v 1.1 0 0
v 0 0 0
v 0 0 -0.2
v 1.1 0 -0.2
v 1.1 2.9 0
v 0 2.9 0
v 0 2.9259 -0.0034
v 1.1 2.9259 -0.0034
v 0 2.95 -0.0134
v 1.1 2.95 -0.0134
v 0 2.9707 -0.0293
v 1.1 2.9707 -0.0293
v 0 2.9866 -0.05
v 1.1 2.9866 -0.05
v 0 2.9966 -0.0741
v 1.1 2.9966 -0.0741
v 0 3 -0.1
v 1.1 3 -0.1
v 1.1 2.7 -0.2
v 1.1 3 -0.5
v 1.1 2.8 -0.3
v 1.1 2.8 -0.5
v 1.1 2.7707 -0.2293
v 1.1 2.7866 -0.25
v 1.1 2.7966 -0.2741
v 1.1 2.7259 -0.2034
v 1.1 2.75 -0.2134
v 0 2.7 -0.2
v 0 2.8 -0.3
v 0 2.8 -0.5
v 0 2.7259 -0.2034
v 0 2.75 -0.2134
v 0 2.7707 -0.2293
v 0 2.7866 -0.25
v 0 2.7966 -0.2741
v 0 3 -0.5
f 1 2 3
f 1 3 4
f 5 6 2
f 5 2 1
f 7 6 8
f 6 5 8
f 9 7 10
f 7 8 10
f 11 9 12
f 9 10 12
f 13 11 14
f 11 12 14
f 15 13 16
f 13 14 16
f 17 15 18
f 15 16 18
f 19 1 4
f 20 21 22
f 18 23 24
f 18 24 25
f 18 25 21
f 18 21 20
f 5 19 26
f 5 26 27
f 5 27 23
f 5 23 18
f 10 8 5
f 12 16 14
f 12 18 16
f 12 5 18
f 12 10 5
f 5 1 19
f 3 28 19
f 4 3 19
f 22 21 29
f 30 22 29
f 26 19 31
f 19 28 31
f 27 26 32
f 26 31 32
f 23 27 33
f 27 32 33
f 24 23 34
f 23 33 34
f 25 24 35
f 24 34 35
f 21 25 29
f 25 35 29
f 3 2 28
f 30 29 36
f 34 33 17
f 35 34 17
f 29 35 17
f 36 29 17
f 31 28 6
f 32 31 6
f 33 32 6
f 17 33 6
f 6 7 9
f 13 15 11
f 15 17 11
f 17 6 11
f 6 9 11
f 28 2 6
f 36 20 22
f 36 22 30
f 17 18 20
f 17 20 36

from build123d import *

# Parameters (mm, degrees)
ESQUISSE1_W        = 1.1
ESQUISSE1_H        = 3
BOSS_EXTRU_1_DEPTH = 0.2
ESQUISSE2_W        = 1.1
ESQUISSE2_H        = 0.2
BOSS_EXTRU_2_DEPTH = 0.3
CONG_1_R           = 0.1


with BuildPart() as part:
    # Esquisse1 → Boss.-Extru.1 (new body)
    with BuildSketch(Plane.XY):
        with Locations((0.55, 1.5)):
            Rectangle(ESQUISSE1_W, ESQUISSE1_H)
    extrude(amount=-BOSS_EXTRU_1_DEPTH)

    # Esquisse2 → Boss.-Extru.2 (add)
    with BuildSketch(Plane(origin=(0, 0, -0.2), x_dir=(-1, 0, 0), z_dir=(0, 0, -1))):
        with Locations((-0.55, 2.9)):
            Rectangle(ESQUISSE2_W, ESQUISSE2_H)
    extrude(amount=BOSS_EXTRU_2_DEPTH)

    # Congé1
    cong_1_edges = [part.edges().sort_by_distance(p)[0] for p in [
        (0.55, 3, 0),
        (0.55, 2.8, -0.2),
    ]]
    fillet(cong_1_edges, radius=CONG_1_R)


solid = part.part
